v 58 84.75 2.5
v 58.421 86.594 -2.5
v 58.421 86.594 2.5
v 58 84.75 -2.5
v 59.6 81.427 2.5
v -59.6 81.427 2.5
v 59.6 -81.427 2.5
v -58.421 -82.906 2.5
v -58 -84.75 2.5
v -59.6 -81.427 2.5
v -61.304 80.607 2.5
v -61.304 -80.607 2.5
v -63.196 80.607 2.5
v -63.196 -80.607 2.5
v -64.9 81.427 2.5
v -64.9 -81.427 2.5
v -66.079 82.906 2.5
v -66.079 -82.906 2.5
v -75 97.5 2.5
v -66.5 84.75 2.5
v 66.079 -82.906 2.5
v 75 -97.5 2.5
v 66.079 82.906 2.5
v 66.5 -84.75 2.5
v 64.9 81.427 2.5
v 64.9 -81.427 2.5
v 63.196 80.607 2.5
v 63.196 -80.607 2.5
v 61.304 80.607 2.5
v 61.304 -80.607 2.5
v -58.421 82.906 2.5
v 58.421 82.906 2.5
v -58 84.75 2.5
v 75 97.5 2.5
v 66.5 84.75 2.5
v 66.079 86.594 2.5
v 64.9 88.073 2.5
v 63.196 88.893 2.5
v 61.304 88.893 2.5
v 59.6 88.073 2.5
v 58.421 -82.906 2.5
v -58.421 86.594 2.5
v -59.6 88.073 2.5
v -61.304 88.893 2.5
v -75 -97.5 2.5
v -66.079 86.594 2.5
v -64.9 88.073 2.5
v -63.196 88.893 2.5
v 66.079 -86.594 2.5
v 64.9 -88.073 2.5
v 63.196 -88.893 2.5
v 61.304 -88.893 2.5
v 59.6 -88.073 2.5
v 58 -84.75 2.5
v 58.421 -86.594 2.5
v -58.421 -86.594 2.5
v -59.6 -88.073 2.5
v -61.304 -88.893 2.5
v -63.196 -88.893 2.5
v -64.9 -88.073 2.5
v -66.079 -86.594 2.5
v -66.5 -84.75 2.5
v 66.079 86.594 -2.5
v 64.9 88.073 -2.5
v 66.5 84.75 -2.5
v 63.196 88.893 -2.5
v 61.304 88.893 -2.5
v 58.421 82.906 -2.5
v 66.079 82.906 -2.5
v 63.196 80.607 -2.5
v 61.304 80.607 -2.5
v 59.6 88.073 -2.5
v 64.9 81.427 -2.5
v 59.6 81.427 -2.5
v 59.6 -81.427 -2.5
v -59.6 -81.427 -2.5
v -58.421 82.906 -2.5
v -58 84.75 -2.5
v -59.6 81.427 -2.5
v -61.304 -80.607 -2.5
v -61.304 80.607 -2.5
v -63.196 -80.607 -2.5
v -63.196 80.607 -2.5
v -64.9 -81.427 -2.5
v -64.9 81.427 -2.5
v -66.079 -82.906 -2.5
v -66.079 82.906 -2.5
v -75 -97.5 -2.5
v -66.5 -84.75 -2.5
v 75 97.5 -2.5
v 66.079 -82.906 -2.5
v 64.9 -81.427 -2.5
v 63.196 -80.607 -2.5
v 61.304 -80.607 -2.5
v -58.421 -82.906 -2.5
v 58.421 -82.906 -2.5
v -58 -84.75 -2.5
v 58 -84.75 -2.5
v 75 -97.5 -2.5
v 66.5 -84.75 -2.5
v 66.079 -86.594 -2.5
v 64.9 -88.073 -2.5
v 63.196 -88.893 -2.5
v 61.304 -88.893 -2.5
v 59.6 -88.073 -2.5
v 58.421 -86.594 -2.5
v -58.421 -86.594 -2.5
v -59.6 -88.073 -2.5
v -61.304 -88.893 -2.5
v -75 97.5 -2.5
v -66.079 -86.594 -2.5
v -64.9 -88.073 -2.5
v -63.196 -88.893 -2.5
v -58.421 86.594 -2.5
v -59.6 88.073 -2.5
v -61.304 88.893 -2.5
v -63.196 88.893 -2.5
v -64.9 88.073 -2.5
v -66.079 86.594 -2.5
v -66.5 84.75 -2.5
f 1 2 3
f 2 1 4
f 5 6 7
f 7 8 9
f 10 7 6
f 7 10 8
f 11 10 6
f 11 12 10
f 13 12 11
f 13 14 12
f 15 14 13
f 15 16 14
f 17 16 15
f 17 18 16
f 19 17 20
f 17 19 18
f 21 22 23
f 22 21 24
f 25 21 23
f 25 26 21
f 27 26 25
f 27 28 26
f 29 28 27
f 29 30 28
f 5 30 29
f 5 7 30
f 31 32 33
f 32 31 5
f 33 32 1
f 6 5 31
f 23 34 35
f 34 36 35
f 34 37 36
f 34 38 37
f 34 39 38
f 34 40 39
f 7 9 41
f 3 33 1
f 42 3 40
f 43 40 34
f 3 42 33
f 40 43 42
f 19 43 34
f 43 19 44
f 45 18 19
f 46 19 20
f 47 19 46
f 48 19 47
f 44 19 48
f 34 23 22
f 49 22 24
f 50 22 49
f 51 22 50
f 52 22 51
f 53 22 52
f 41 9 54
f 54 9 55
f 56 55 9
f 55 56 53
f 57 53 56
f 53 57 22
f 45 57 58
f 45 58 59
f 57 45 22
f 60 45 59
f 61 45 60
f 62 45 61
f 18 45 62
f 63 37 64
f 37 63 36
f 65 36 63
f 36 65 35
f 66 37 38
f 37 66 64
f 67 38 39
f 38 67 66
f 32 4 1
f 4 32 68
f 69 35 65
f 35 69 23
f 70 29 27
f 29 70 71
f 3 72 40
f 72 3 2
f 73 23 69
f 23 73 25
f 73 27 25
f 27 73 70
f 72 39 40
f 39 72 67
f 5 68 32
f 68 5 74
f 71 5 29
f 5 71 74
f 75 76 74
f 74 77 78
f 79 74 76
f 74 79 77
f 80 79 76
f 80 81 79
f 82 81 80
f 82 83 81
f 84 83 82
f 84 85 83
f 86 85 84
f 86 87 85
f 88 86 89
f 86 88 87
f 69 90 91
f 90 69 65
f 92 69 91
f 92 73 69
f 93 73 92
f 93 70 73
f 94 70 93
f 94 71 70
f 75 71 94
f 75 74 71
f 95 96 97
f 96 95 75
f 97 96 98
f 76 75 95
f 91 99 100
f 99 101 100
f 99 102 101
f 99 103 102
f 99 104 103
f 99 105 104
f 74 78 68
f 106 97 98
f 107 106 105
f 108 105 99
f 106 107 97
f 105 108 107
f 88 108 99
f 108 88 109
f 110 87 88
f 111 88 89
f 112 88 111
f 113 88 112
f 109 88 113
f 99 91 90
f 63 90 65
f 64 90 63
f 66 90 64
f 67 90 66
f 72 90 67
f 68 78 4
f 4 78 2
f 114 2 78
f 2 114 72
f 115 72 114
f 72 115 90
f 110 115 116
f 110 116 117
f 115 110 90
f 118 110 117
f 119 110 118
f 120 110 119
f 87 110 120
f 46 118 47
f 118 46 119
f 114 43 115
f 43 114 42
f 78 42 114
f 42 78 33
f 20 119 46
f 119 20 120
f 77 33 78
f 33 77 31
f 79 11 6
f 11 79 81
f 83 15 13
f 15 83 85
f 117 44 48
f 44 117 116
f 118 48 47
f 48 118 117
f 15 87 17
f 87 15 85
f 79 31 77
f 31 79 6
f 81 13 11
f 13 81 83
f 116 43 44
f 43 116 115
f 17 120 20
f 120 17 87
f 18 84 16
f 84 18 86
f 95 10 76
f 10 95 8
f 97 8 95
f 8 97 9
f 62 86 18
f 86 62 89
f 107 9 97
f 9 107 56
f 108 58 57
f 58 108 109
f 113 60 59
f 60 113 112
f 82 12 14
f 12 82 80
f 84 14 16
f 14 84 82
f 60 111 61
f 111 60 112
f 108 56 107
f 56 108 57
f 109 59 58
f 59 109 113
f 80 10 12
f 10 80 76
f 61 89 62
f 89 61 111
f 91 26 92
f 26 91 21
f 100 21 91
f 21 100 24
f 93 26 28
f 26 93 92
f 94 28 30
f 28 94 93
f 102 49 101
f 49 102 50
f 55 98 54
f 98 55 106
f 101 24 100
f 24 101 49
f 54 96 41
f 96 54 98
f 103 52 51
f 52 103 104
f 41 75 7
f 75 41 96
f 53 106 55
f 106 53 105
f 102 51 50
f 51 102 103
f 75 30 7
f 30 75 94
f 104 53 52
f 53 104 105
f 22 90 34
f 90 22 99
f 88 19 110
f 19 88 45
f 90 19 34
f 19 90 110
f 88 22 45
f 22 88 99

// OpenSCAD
// Generated by SolidPython 1.1.3 on 2023-10-16 11:59:45


difference() {
	cube(center = true, size = [150, 195.0000000000, 5]);
	union() {
		translate(v = [62.2500000000, 84.7500000000]) {
			cylinder(center = true, h = 5, r = 4.2500000000);
		}
		translate(v = [-62.2500000000, 84.7500000000]) {
			cylinder(center = true, h = 5, r = 4.2500000000);
		}
		translate(v = [-62.2500000000, -84.7500000000]) {
			cylinder(center = true, h = 5, r = 4.2500000000);
		}
		translate(v = [62.2500000000, -84.7500000000]) {
			cylinder(center = true, h = 5, r = 4.2500000000);
		}
	}
}
/***********************************************
*********      SolidPython code:      **********
************************************************
 
import solid
import numbers
import pudb
from solid.utils import *
import viewscad
import subprocess
import os
import os.path as osp
import math
import sys

chamfer_extrude=solid.import_scad("./chamfer_extrude.scad")
chamfer_extrude=chamfer_extrude.chamfer_extrude
r = viewscad.Renderer(width=800, height=800)

def debug(model,f_name,path="/home/ts/code/projects/mfd/designs/debug"):
    solid.scad_render_to_file(model,osp.join(path,f_name)+".scad")
#generate position list of wells using offset from center
wells_pos_from_center_4 = lambda offset: [[-offset,offset],
                                        [offset, offset],
                                        [-offset, -offset],
                                        [offset, -offset]]
#wells_pos_from_center_2 = lambda offset: [[0,offset],
#                                        [0, -offset]]
wells_pos_from_center_2 = lambda offset: [[offset,0],
                                        [-offset,0]]

def make_well(dims,shape=None,height=None,dxf=False):
    def circle_cylinder():
        if dxf or (height is None):
            well = solid.circle(r=dims, segments=64)
        else:
            well = solid.cylinder(r=dims, h=height, segments=64, center = True)
        return well
    if dims is None:
        sys.exit("radius needs to be a number")
    if isinstance(dims, numbers.Number):
        well =circle_cylinder()
    elif len(dims)==1:
        if isinstance(dims[1], numbers.Number):
            well =circle_cylinder()
        else:
            sys.exit("radius needs to be a number")
    elif len(dims)==2:
        well = solid.square(dims,center = True)
    elif len(dims)==3:
        well = solid.cube(dims, center = True)
    return well

def wells_top_bottom(center_gap,device_dims=None,shape=None,height=None, positions = None, dxf = False):
    well_shape = make_well(device_dims,shape=shape,height=height,dxf=dxf)
    wells = []
    if positions is None:
        offset = radius+radius/2.0
        positions = wells_pos_from_center_2(offset)
    if dxf or (height is None):
        height = 0
    for position in positions:
        if dxf:
            wells.append(solid.translate([position[0],position[1]])(well_shape))
        else:
            wells.append(solid.translate([position[0],position[1],height/2.0])(well_shape))
    return  union()(*wells)

#place wells in four corners 
def four_corner(radius,height=None, positions = None, dxf = False):
    #if well pos not specified set
    #to equally spaced by half radius
    if positions is None:
        offset = radius+radius/2.0
        positions = wells_pos_from_center_4(offset)
    if dxf or (height is None):
        height = 0
    #make wells at positions with specified radius and height
    wells = []
    for position in positions:
        #make circle if making dxf
        if dxf:
            well_shape = solid.circle(r=radius, segments=64)
            well_shape = solid.translate([position[0],position[1]])(well_shape)
        #if stl make cylinder
        else:
            well_shape = solid.cylinder(r=radius, h=height, segments=64, center = True)
            well_shape = solid.translate([position[0],position[1],height/2.0])(well_shape)
        wells.append(well_shape)
    return  union()(*wells)

#generate channels 
def make_channels(length,width,height=0,num_chans=1,max_chans=None,spacing=None, dxf = False,
                  rotate_channels=False):
    if dxf or (height is None):
        height = 0
    #if channel gap not defined, is equal to
    if spacing is None: spacing = width
    #calculate number of channels if fitting max num within given width
    if not max_chans is None:
        import math
        num_chans = math.floor((max_chans-spacing)/(width+spacing))
    #get total width of channel section  
    total_width = (width*num_chans)+(spacing*(num_chans-1))

    #make template channel
    #if rotate_channels: width, length = length, width
    if dxf:
        channel_t = solid.square([length,width],center = True)
    else:
        channel_t = solid.cube([length,width,height], center = True)

    #if number channels is even, offset the first channel to center its gap
    if num_chans % 2 == 0: centering = -(width/2.0+spacing/2.0)
    else: centering = 0
    #move template channel up to align bottom at z = 0 
    #and offset center if necessary
    if dxf:
        channel_t = solid.translate([0,centering])(channel_t)
    else:
        channel_t = solid.translate([0,centering,height/2.0])(channel_t)

    #if rotate_channels: length,width = width,length
    #start making the channels
    channels = []
    for i in range(num_chans):
        #if i=0 there is no translation
        #if i=1, we make the first channel adjacent to second
        direction = i

        #if i>=1, we add channels alternating left and right
        if i >= 1:
            direction = -(i/2.0)
            if i % 2 == 1: direction = (-direction)+0.5
                
        #make channel at right position and add it to channel list
        translation_coords = [0,direction*(width+spacing)]
        #if rotate_channels: translation_coords = [direction*(width+spacing),0]
        if dxf:
            channel = solid.translate(translation_coords)(channel_t)
        else:
            channel = solid.translate([*translation_coords,0])(channel_t)
        channels.append(channel)
    
    #group all channels as one object
    channels = union()(*channels)
    #compute the x,y,z dimensions in order to pass as arguments 
    #for construction of other parts of device (such as the chambers)
    measurements = {'x':(length/2.0,-length/2.0),
                    'y':(total_width/2.0,-total_width/2.0)}
    if not dxf:
        measurements['z'] = (height,0)
    if rotate_channels:
        channels = solid.rotate(90)(channels)
        measurements['x'],measurements['y']=measurements['y'],measurements['x']
    return channels,measurements

def make_chambers(msrs,height=None,extra=0,len_until=None,width=None, dxf = False):
    #computes x,y,z length
    total = lambda x : abs(x[0]) + abs(x[1])
    
    #if specific height if specified
    #otherwise use same height as channels
    if dxf:
        pass
    elif not height is None:
        msrs['z'] = (height,0)
    else:
        msrs['z'] = (0,0)
        
    #make copy of measurements from channels to modify chamber dimensions 
    #and add length to chambers as specified
    chamber_dims = msrs.copy()
    #calculate length of chamber to reach specified offset
    if not len_until is None:
        chamber_len = len_until-(msrs['x'][0])
    #or add specified length to channel length (if not specified, adds 0)
    else:
        chamber_len = msrs['x'][0]+extra
    #set the chamber length based 
    chamber_dims['x'] = (chamber_len/2.0,-(chamber_len/2.0))
    #compute final dimensions of chamber
    if not width is None:
        chamber_dims['y'] = (width/2.0,-width/2.0)
    chamber_dims = [total(size) for size in chamber_dims.values()]
        
    #calculate chamber translation offset to place adjacent to channels
    chamber_trslt = msrs['x'][0]+(chamber_len/2.0)
    #compute chamber translation coordinates to align with channels
    #x = 1 moves chamber above channels
    #x = -1 moves chamber below channels
    if dxf:
        trslt = lambda x : [x*(chamber_trslt),0]
    else:
        trslt = lambda x : [x*(chamber_trslt),0,msrs['z'][0]/2.0]
    
    #function to make chamber at top or at bottom 
    if dxf:
        move = lambda x : solid.translate(trslt(x))(solid.square(chamber_dims, center = True) )
    else:
        move = lambda x : solid.translate(trslt(x))(solid.cube(chamber_dims,center = True))
    #make top and bottom chambers and return them as grouped
    top = move(1)
    bottom = move(-1)
    #chambers=solid.rotate(90)(solid.union()(top,bottom))
    chambers=(solid.union()(top,bottom))

    return chambers

#create alignment features 
def alignment_features(unit,dims,grid_size, mask_size = None, alignment = "hollow", units_from_center = (2.5,2.5), corner_len=None):
    width = grid_size[0]*dims[0]
    length = grid_size[1]*dims[1]
    if mask_size is None and corner_len is None:
        corner_len = (dims[0] + dims[1]) /2 / 8
    corner = lambda thickness_div : solid.union()( solid.square([corner_len,corner_len/thickness_div],center=False), solid.square([corner_len/thickness_div,corner_len],center=False) )
    
    def make_full(thickness_div):
        thickness = corner_len/thickness_div
        tr = solid.translate([0, 0, 0 ])(solid.rotate(180)(corner(thickness_div)))
        tr = solid.translate([thickness/2,thickness/2,0])(tr)
        bl = solid.translate([0, 0, 0 ])(solid.rotate(0)(corner(thickness_div)))
        bl = solid.translate([-thickness/2,-thickness/2,0])(bl)
        return solid.union()(tr,bl)
    
    def make_hollow(thickness_div):
        thickness = corner_len/(thickness_div/2)
        inner = make_full(thickness_div)
        outer = make_full(thickness_div/2)
        hollow = outer - inner 
        return hollow
    
    center = (width /2 , length/2)
    mask_pos = lambda x,y : (center[0] + x*(float(units_from_center[0])*dims[0]), center[1] + y*(float(units_from_center[1])*dims[1]))
    positions = []
    positions.append(mask_pos(1,0))
    positions.append(mask_pos(0,1))
    positions.append(mask_pos(-1,0))
    positions.append(mask_pos(0,-1))
    make_mask = lambda mtype : make_hollow(8) if mtype == "hollow" else make_full(8)
    masks = [ solid.translate([*position,0])(make_mask(alignment)) for position in positions]
    
    solid.scad_render_to_file(solid.union()(*masks),"./designs/open_chamber/masks.scad")
    #return unit - solid.union()(*masks)
    return solid.union()(*masks,unit)

def create_outline(thickness, array, dims, grid_size,):
    width = grid_size[0]*dims[0] + thickness *2
    length = grid_size[1]*dims[1] + thickness *2
    outer = solid.translate([-thickness, -thickness,0])(solid.square([width, length]))
    return outer-array

def create_wall(wall_thickness, outline_thickness, dims, grid_size, wall_height = 2000, dxf = False):
    inner_width = grid_size[0]*dims[0] + outline_thickness *2
    inner_length = grid_size[1]*dims[1] + outline_thickness *2
    outer_width = inner_width + wall_thickness * 2
    outer_length = inner_length + wall_thickness * 2
    outer_pos_x = -outline_thickness-wall_thickness
    outer_pos_y = -outline_thickness-wall_thickness
    inner_pos_x = -outline_thickness
    inner_pos_y = -outline_thickness
    if dxf:
        inner_wall = solid.translate([inner_pos_x,
                                      inner_pos_y,
                                      0])(solid.square([inner_width, inner_length]))
        outer_wall = solid.translate([outer_pos_x,
                                      outer_pos_y,
                                      0])(solid.square([outer_width, outer_length]))

        return outer_wall-inner_wall
    else:
        inner_wall = solid.translate([inner_pos_x,
                                      inner_pos_y,
                                      0])(solid.cube([inner_width, inner_length,wall_height]))
        outer_wall = solid.translate([outer_pos_x,
                                      outer_pos_y,
                                      0])(solid.cube([outer_width, outer_length,wall_height]))

        return outer_wall-inner_wall, {'wall_height': wall_height,
                                       'wall_thickness': wall_thickness,
                                       'inner_width':inner_width,
                                       'inner_length': inner_length,
                                       'outer_width': outer_width,
                                       'outer_length': outer_length,
                                       'outer_pos_x' : outer_pos_x,
                                       'outer_pos_y' : outer_pos_y,
                                       'inner_pos_x' : inner_pos_x,
                                       'inner_pos_y' : inner_pos_y}

def create_thicker_wall(wall_thickness, outer_wall_offset, wall_dims, dims, grid_size, height_start = .2, height_end=2, dxf = False):
    addon_wall,thicker_wall_dims = create_wall(wall_thickness, outer_wall_offset, dims, grid_size, wall_height=height_end-height_start, dxf = False)
    addon_wall = solid.translate([0,0,height_start])(addon_wall)

    thicker_wall_dims['wall_height'] = height_end
    thicker_wall_dims['wall_thickness'] = wall_dims['wall_thickness'] + wall_thickness
    return addon_wall, thicker_wall_dims
 
def add_lock_to_wall(wall,wall_dims,y_offset = 0,cut_ratio=0.7,L_length=3, gap_ratio=0.05, axis="x",width_ratio=1/2):
    # Makes L shape
    def make_L(max_length,length_thickness,max_width,width_thickness,height,y_offset):
        length = solid.cube([max_length,length_thickness,height])
        width = solid.cube([width_thickness,max_width,height])
        width = solid.translate([max_length-(width_thickness),0,0])(width)
        L = solid.union()(width,length)
        debug(L,"L")
        if axis == "x":
            L = solid.rotate(-90)(L)
            L = solid.translate([0,max_length,0])(L)
        else:
            L = solid.rotate(-180)(L)
            L = solid.translate([max_length,max_width,0])(L)
        return solid.translate([0,0,y_offset])(L)
    
    lock_length = L_length
    lock_width = wall_dims['wall_thickness']*width_ratio
    lock_length_thickness = lock_width/2
    lock_width_thickness = lock_width/2
    L_lock = make_L(lock_length,lock_length_thickness,lock_width,lock_width_thickness, wall_dims['wall_height']-y_offset, y_offset)
    
    margin_space = lock_length - lock_length*(1-gap_ratio)
    key_length = lock_length-margin_space
    key_length_thickness = lock_length_thickness-(margin_space*2)
    key_width = lock_width-(margin_space*2)
    key_width_thickness = lock_width_thickness-(margin_space*2)
    L_key = make_L(key_length,key_length_thickness,key_width,key_width_thickness, wall_dims['wall_height']-y_offset, y_offset)
    L_key = solid.translate([margin_space,margin_space,0])(L_key)
    L = solid.union()(L_lock,L_key)
    debug(L,"L")
    
    #Make cube to be used as negative to split frame in a half
    #Can choose if making left or right negative, specify ratio of split
    def make_negative(right,cut_ratio):
        if axis == "x":
            if right:
                length = wall_dims['outer_length']*(1-cut_ratio)
                pos_x = wall_dims['outer_pos_x']+(wall_dims['outer_length']*cut_ratio)
            else:
                length = wall_dims['outer_length']*(cut_ratio)
                pos_x = wall_dims['outer_pos_x'] 
            negative = solid.cube([wall_dims['outer_width'],length, wall_dims['wall_height']])
            negative = solid.translate([wall_dims['outer_pos_y'],pos_x,0])(negative)
        else:
            if right:
                length = wall_dims['outer_width']*(1-cut_ratio)
                pos_x = wall_dims['outer_pos_y']+(wall_dims['outer_width']*cut_ratio)
            else:
                length = wall_dims['outer_width']*(cut_ratio)
                pos_x = wall_dims['outer_pos_y'] 
            negative = solid.cube([length,wall_dims['outer_length'], wall_dims['wall_height']])
            negative = solid.translate([pos_x,wall_dims['outer_pos_x'],0])(negative)
        return negative, pos_x, length 
                      
    #Make negatives
    negative_right, right_half_pos_x, right_half_length = make_negative(True,cut_ratio)
    negative_left, left_half_pos_x, right_half_length = make_negative(False,cut_ratio)
    #Make halves
    left_half = solid.difference()(wall,negative_right)
    right_half = solid.difference()(wall,negative_left)
    def place_L(L, L_length,L_width):
        #Place L on top wall       
        offset_to_center = (wall_dims['wall_thickness']-L_width)/2
        if axis == "x":
            y_pos_top = (wall_dims['outer_pos_y'] +
                    wall_dims['outer_width'] - 
                    L_width - offset_to_center)
            top_L = solid.translate([y_pos_top,
                                     right_half_pos_x-(L_length),
                                     0])(L)
            #Place L on bottom wall       
            y_pos_bottom = wall_dims['outer_pos_y']+offset_to_center
            bottom_L = solid.translate([y_pos_bottom,
                                        right_half_pos_x-L_length,
                                        0])(L)
        else:
            y_pos_top = (wall_dims['outer_pos_x'] +
                    wall_dims['outer_length'] -
                    (L_width+offset_to_center))
            top_L = solid.translate([right_half_pos_x-L_length,
                                     y_pos_top,
                                     0])(L)
            #Place L on bottom wall       
            y_pos_bottom = wall_dims['outer_pos_y']+offset_to_center
            bottom_L = solid.translate([right_half_pos_x-L_length,
                                        y_pos_bottom,
                                        0])(L)
        return bottom_L, top_L
    #Make complimentary L pieces through union and differences
    #Make Lock
    bottom_L_lock, top_L_lock = place_L(L_lock,L_length,lock_width)
    left_half = solid.difference()(left_half,bottom_L_lock)
    left_half = solid.difference()(left_half,top_L_lock)
    #Make Key
    bottom_L_key, top_L_key = place_L(L_key,L_length,lock_width)
    right_half = solid.union()(right_half,bottom_L_key)
    right_half = solid.union()(right_half,top_L_key)
    return left_half, right_half


#build a row x col grid of containment units
def make_unit_array(unit,dims,grid_size, dxf = False, alignment = None, mask_size = None,
                    units_from_center = None,alignment_offset=None, alignment_mark_size=1):
    units = []
    for col in range(grid_size[1]):
        for row in range(grid_size[0]):
            if dxf:
                units.append(solid.translate([row*dims[0],col*dims[1]])(unit))
            else:
                units.append(solid.translate([row*dims[0],col*dims[1],dims[2]/2.0])(unit))
    array = solid.union()(*units)
    if (not alignment is None) and dxf:
        if not alignment_offset is None:
            array = solid.translate([alignment_offset[0],alignment_offset[1]])(array)
        array = alignment_features(array,dims, grid_size, alignment = alignment, mask_size = None, units_from_center = units_from_center,corner_len=alignment_mark_size)
        if not alignment_offset is None:
            array = solid.translate([-alignment_offset[0],-alignment_offset[1]])(array)
    return array


def make_taylor(wells_pos = wells_pos_from_center_4(2.25), well_rad = 1.5 ,
                well_height = 2, chan_w = 0.01, chan_l = 1, chan_h = 0.010 ,
                chan_gap = 0.040, max_chans = None,num_chans=100, chamber_height  = 0.100,
                columns = 1, rows = 1, chamber_len_until=2.25, add_channels = True, add_wells = True, 
                add_chambers = True, save_path = "./", alignment = None, units_from_center = 2,
                mask_size = None, render_stl = False, outline_thickness = 0.050, dxf = True,
                wall_height = 15, wall_thickness = 0.95, casing_x=9, casing_y=9, casing_z=0,rotate_units=0):

    dims = [casing_x, casing_y, casing_z]
    wells = four_corner(well_rad,well_height, dxf = dxf, positions = wells_pos)
    debug(wells,"wells")
    channels, msrs = make_channels(chan_l,chan_w,chan_h,dxf=dxf, spacing = chan_gap, max_chans=max_chans,num_chans=num_chans)
    debug(channels,"channels")
    chambers = make_chambers(msrs,dxf = dxf, height=chamber_height,len_until=chamber_len_until)
    debug(chambers,"chambers")

    #add together and render
    device_parts = []
    if add_channels:
        device_parts.append(channels)
    if add_wells:
        device_parts.append(wells)
    if add_chambers:
        device_parts.append(chambers)
    device=union()(*device_parts)
    device = rotate(rotate_units)(device)

    device=solid.translate([dims[0]/2.0,dims[1]/2.0,0])(device)
    channels = rotate(rotate_units)(channels)
    channels=solid.translate([dims[0]/2,dims[1]/2,0])(channels)
    chambers_wells = union()(wells,chambers)
    chambers_wells = rotate(rotate_units)(chambers_wells)
    chambers_wells=solid.translate([dims[0]/2,dims[1]/2,0])(chambers_wells)

    file_name = str(rows)+'x'+str(columns)+'_units_'
    grid_size = [rows,columns]

    if alignment:
        alignment="full"
    device = make_unit_array(device,dims,grid_size, dxf=dxf, alignment = alignment,
                                 units_from_center = units_from_center)
    channels = make_unit_array(channels,dims,grid_size, dxf=dxf, alignment = alignment,
                                 units_from_center = units_from_center)
    if alignment=="full":
        alignment="hollow"

    chambers_wells = make_unit_array(chambers_wells,dims,grid_size, dxf=dxf, alignment = alignment,
                                 units_from_center =units_from_center)

    def save_model(model,prefix):
        model_fname = os.path.abspath(save_path+prefix+"_"+file_name+".scad")
        solid.scad_render_to_file(model,model_fname)
        return model_fname

    wells_fname = save_model(wells,"wells")
    channels_fname = save_model(channels,"channels")
    device_fname = save_model(device,"device")
    chambers_wells_fname = save_model(chambers_wells,"chambers_wells")
    return (chambers_wells,chambers_wells_fname), (channels,channels_fname), (device,device_fname)

def make_device(design='open',rows=8,columns=6,wells_pos = 4.5,well_offset=3.2, well_rad=3.2,well_height=0.1,
                chan_l=1,chan_w=0.01,chan_h=0.01,chan_gap=0.015,num_chans=101,dxf=True,save_path="./designs/open_chamber/",
                casing_x=9.0,casing_y=18.0,casing_z=0,rotate_units=90,units_from_center=(3,1),chamber_len_until=4.5,
                chamber_width=None,alignment=True, add_wells=True, add_channels=True,add_chambers=True):

    dims = [casing_x, casing_y, casing_z]
    if design == "open":
        wells_pos=wells_pos_from_center_2(wells_pos)
        wells = wells_top_bottom(well_offset*2,device_dims=well_rad,height=well_height, dxf = dxf, positions = wells_pos)
    elif design == "closed":
        wells_pos=wells_pos_from_center_4(wells_pos)
        debug(wells,"wells")
        wells = four_corner(well_offset,well_heightdevice_dims=well_rad, dxf = dxf, positions = wells_pos)
    else:
        print(design+" is not a valid design.\n Choose valid design: 'open' or 'closed'")
        exit()
    wells = rotate(rotate_units)(wells)
    wells=solid.translate([dims[0]/2,dims[1]/2,0])(wells)
    debug(wells,"wells")

    channels, msrs = make_channels(chan_l,chan_w,chan_h,dxf=dxf, spacing = chan_gap, num_chans=num_chans,rotate_channels=False)
    channels = rotate(rotate_units)(channels)
    channels=solid.translate([dims[0]/2,dims[1]/2,0])(channels)

    chambers=make_chambers(msrs,height=None,extra=0,len_until=chamber_len_until, width=chamber_width,dxf = dxf)
    chambers = rotate(rotate_units)(chambers)
    chambers=solid.translate([dims[0]/2,dims[1]/2,0])(chambers)

    device_parts = []
    if add_channels:
        device_parts.append(channels)
    if add_wells:
        device_parts.append(wells)
    if add_chambers:
        device_parts.append(chambers)
    device = union()(*device_parts)
    #device = rotate(rotate_units)(device)
    #device=solid.translate([dims[0]/2.0,dims[1]/2.0,0])(device)

    chambers_wells = []
    if add_chambers:
        chambers_wells.append(chambers)
    if add_wells:
        chambers_wells.append(wells)
    chambers_wells = union()(*chambers_wells)
    #chambers_wells = union()(wells,chambers)
    #chambers_wells = rotate(rotate_units)(chambers_wells)
    #chambers_wells=solid.translate([dims[0]/2,dims[1]/2,0])(chambers_wells)

    file_name = str(rows)+'x'+str(columns)+'_units_'

    grid_size = [rows,columns]
    if alignment:
        alignment="full"
    device = make_unit_array(device,dims,grid_size, dxf=dxf, alignment = alignment,
                                 units_from_center = units_from_center)
    channels = make_unit_array(channels,dims,grid_size, dxf=dxf, alignment = alignment,
                                 units_from_center = units_from_center)
    if alignment=="full":
        alignment="hollow"

    chambers_wells = make_unit_array(chambers_wells,dims,grid_size, dxf=dxf, alignment = alignment,
                                 units_from_center =units_from_center)

    def save_model(model,prefix):
        model_fname = os.path.abspath(save_path+prefix+"_"+file_name+".scad")
        solid.scad_render_to_file(model,model_fname)
        return model_fname

    wells_fname = save_model(wells,"wells")
    channels_fname = save_model(channels,"channels")
    device_fname = save_model(device,"device")
    chambers_wells_fname = save_model(chambers_wells,"chambers_wells")
    return (chambers_wells,chambers_wells_fname), (channels,channels_fname), (device,device_fname)


def make_open_chamber(rows=8,columns=6,wells_pos = wells_pos_from_center_2(4.5), well_rad=3.2,well_height=0.1,
                      chan_l=1,chan_w=0.01,chan_h=0.01,chan_gap=0.015,num_chans=101,dxf=True,save_path="./designs/open_chamber/",
                      casing_x=9.0,casing_y=18.0,casing_z=0,rotate_units=90,units_from_center=(3,1),chamber_len_until=4.5,
                      chamber_width=None,alignment=True, add_wells=True, add_channels=True,add_chambers=True):

    dims = [casing_x, casing_y, casing_z]
    wells = wells_top_bottom(well_rad,height=well_height, dxf = dxf, positions = wells_pos)
    channels, msrs = make_channels(chan_l,chan_w,chan_h,dxf=dxf, spacing = chan_gap, num_chans=num_chans,rotate_channels=False)
    chambers=make_chambers(msrs,height=None,extra=0,len_until=chamber_len_until, width=chamber_width,dxf = dxf)
    debug(chambers,"chambers")
    device_parts = []
    if add_channels:
        device_parts.append(channels)
    if add_wells:
        device_parts.append(wells)
    if add_chambers:
        device_parts.append(chambers)
    device = union()(*device_parts)
    device = rotate(rotate_units)(device)
    device=solid.translate([dims[0]/2.0,dims[1]/2.0,0])(device)
    channels = rotate(rotate_units)(channels)
    channels=solid.translate([dims[0]/2,dims[1]/2,0])(channels)
    chambers_wells = union()(wells,chambers)
    chambers_wells = rotate(rotate_units)(chambers_wells)
    chambers_wells=solid.translate([dims[0]/2,dims[1]/2,0])(chambers_wells)

    file_name = str(rows)+'x'+str(columns)+'_units_'

    grid_size = [rows,columns]
    if alignment:
        alignment="full"
    device = make_unit_array(device,dims,grid_size, dxf=dxf, alignment = alignment,
                                 units_from_center = units_from_center)
    channels = make_unit_array(channels,dims,grid_size, dxf=dxf, alignment = alignment,
                                 units_from_center = units_from_center)
    if alignment=="full":
        alignment="hollow"

    chambers_wells = make_unit_array(chambers_wells,dims,grid_size, dxf=dxf, alignment = alignment,
                                 units_from_center =units_from_center)

    def save_model(model,prefix):
        model_fname = os.path.abspath(save_path+prefix+"_"+file_name+".scad")
        solid.scad_render_to_file(model,model_fname)
        return model_fname

    wells_fname = save_model(wells,"wells")
    channels_fname = save_model(channels,"channels")
    device_fname = save_model(device,"device")
    chambers_wells_fname = save_model(chambers_wells,"chambers_wells")
    return (chambers_wells,chambers_wells_fname), (channels,channels_fname), (device,device_fname)

def to_dxf(scad_path):
    dxf_path = scad_path.replace(".scad",".dxf")
    subprocess.call(["openscad", "-o", dxf_path, scad_path])
    import ezdxf
    temp_dxf = ezdxf.readfile(dxf_path)
    temp_dxf.saveas(dxf_path)

#def make_walls(diameter,thickness,grid_size,dims,height=20,segments=256,make_inner=True):
#    wafer_wall_out = solid.cylinder(r=diameter/2,h=height, segments=segments)
#    wafer_wall_in = solid.cylinder(r=(diameter/2-thickness),h=height, segments=segments)
#    wafer_wall = solid.difference()(wafer_wall_out,wafer_wall_in)
#    wafer_wall = solid.translate([grid_size[1]*dims[1]/2.0,grid_size[0]*dims[0]/2.0])(wafer_wall)
#
#    vertical_wall_length = grid_size[1]*dims[1]
#    horizontal_wall_length = grid_size[0]*dims[0]
#    vertical_wall = solid.cube([vertical_wall_length,thickness,height],center = True)
#    vertical_wall = solid.translate([vertical_wall_length/2,0,height/2])(vertical_wall)
#    horizontal_wall = solid.cube([thickness,horizontal_wall_length,height],center = True)
#    horizontal_wall = solid.translate([0,vertical_wall_length/2,height/2])(horizontal_wall)
#    walls = []
#    walls.append(horizontal_wall)
#    walls.append(vertical_wall)
#    for col in range(grid_size[1]):
#        if col == grid_size[1]-1: 
#            walls.append(solid.translate([0,(col+1)*dims[1]])(vertical_wall))
#        elif col > 0 and col < grid_size[1]-1 and make_inner==True:
#            walls.append(solid.translate([0,(col+1)*dims[1]])(vertical_wall))
#    for row in range(grid_size[0]):
#        if row == grid_size[0]-1: 
#            walls.append(solid.translate([(row+1)*dims[0],0])(horizontal_wall))
#        elif row > 0 and row < grid_size[0]-1 and make_inner==True:
#            walls.append(solid.translate([(row+1)*dims[0],0])(horizontal_wall))
#    walls = union()(*walls)
#    wafer_walls = union()(walls,wafer_wall)
#    return walls,wafer_wall,wafer_walls

def make_walls(diameter,thickness,grid_size,dims,height=20,segments=256,make_inner=True,padx=0,pady=0):
    wafer_wall_out = solid.cylinder(r=diameter/2,h=height, segments=segments)
    wafer_wall_in = solid.cylinder(r=(diameter/2-thickness),h=height, segments=segments)
    wafer_wall = solid.difference()(wafer_wall_out,wafer_wall_in)
    wafer_wall = solid.translate([grid_size[1]*dims[1]/2.0,grid_size[0]*dims[0]/2.0])(wafer_wall)

    vertical_wall_length = grid_size[0]*dims[0]+padx
    horizontal_wall_length = grid_size[1]*dims[1]+pady
    vertical_wall = solid.cube([vertical_wall_length,thickness,height],center = True)
    vertical_wall = solid.translate([vertical_wall_length/2-pady/2,-padx/2,height/2])(vertical_wall)
    horizontal_wall = solid.cube([thickness,horizontal_wall_length,height],center = True)
    horizontal_wall = solid.translate([-pady/2,horizontal_wall_length/2-padx/2,height/2])(horizontal_wall)
    walls = []
    walls.append(horizontal_wall)
    walls.append(vertical_wall)
    for col in range(grid_size[1]):
        if col == grid_size[1]-1: 
            walls.append(solid.translate([0,(col+1)*dims[1]+pady])(vertical_wall))
        elif col > 0 and col < grid_size[1]-1 and make_inner==True:
            walls.append(solid.translate([0,(col+1)*dims[1]])(vertical_wall))
    for row in range(grid_size[0]):
        if row == grid_size[0]-1: 
            walls.append(solid.translate([(row+1)*dims[0]+padx,0])(horizontal_wall))
        elif row > 0 and row < grid_size[0]-1 and make_inner==True:
            walls.append(solid.translate([(row+1)*dims[0],0])(horizontal_wall))
    walls = union()(*walls)
    wafer_walls = union()(walls,wafer_wall)
    return walls,wafer_wall,wafer_walls

def save_model(model,base_path,base_name,dxf=True):
    if not os.path.exists(base_path):
        os.makedirs(base_path)
    dxf_path=osp.join(base_path,base_name+".scad")
    solid.scad_render_to_file(model,osp.join(dxf_path))
    if dxf:
        to_dxf(dxf_path)

def make_wafer(diameter,flat_len,thickness):
    wafer = solid.cylinder(r1=diameter/2,r2=diameter/2,h=thickness,segments=512,)()
    x_start_flat=(flat_len/2)
    y_start_flat = math.sqrt(((diameter/2)**2) - (x_start_flat**2) )
    height_delete_flat=diameter/2-y_start_flat
    flat_delete = solid.cube([flat_len,height_delete_flat,thickness],center=False)()
    flat_delete = solid.translate([-flat_len/2,y_start_flat,0])(flat_delete)
    wafer = solid.difference()(wafer,flat_delete)
    wafer = solid.rotate(90)(wafer)
    return wafer

def add_wafer_to_mask(wafer_size,flat_len,mask,grid_size,dims,wafer_line_thickness=0.1,outer_mask_thickness=5,alignment_offset=None):
    def make_wafer_mask(wafer_size,flat_len):
        wafer_mask = make_wafer(wafer_size,flat_len,1)
        wafer_mask = solid.projection()(wafer_mask)
        wafer_mask = solid.translate([grid_size[0]*dims[0]/2.0,grid_size[1]*dims[1]/2.0])(wafer_mask)
        if not alignment_offset is None:
            wafer_mask = solid.translate([-alignment_offset[0],-alignment_offset[1]])(wafer_mask)
        return wafer_mask

    inner_wafer_line_mask = make_wafer_mask(wafer_size-wafer_line_thickness/2,flat_len)
    outer_wafer_line_mask = make_wafer_mask(wafer_size+wafer_line_thickness/2,flat_len)
    outer_wafer_mask = make_wafer_mask(wafer_size+outer_mask_thickness,flat_len)
    outer_wafer_mask = solid.difference()(outer_wafer_mask,outer_wafer_line_mask)
    wafer_mask = solid.union()(outer_wafer_mask,inner_wafer_line_mask)

    return solid.difference()(wafer_mask,mask)

def make_posts(post_shape,post_height):
    posts = solid.linear_extrude(height=post_height)(post_shape)
    return posts

def make_wafer_empty(diameter,flat_len,thickness,margin,notch_len=20,notch_height=5,oversize=1.01):
    diameter*=oversize
    flat_len*=oversize
    wafer = make_wafer(diameter,flat_len,thickness)
    holder = solid.cylinder(r1=diameter/2+margin,r2=diameter/2+margin,h=thickness,segments=512)()
    holder = solid.difference()(holder,wafer)

    x_start_flat=(flat_len/2)
    y_start_flat = math.sqrt(((diameter/2)**2) - (x_start_flat**2) )
    height_delete_flat=diameter/2-y_start_flat
    notch = solid.cube([notch_len,notch_height,thickness],center=False)()
    notch = solid.translate([-notch_len/2,y_start_flat,0])(notch)
    notch = solid.rotate(90)(notch)
    return solid.difference()(holder,notch)

def wafer_print_calibration(diameter,thickness,height,z_offset):
    circles = []
    radii = []
    radii.append(diameter/2.0*0.8)
    radii.append(diameter/2.0*0.6)
    radii.append(diameter/2.0*0.4)
    radii.append(diameter/2.0*0.2)
    for radius in radii:
        inner = solid.cylinder(r1=radius-(thickness/2.0),r2=radius-(thickness/2.0),h=thickness,segments=512,)()
        outer = solid.cylinder(r1=radius+(thickness/2.0),r2=radius+(thickness/2.0),h=thickness,segments=512,)()
        diff = solid.difference()(outer,inner)
        circles.append(diff)
    circles = solid.union()(*circles)
    circles = solid.translate([0,0,z_offset])(circles)
    return circles

def make_rack(wells,dims,grid_size,alignment_offset,rack_x,rack_y,rack_thickness,bolt_width,add_bolts=True):

    #get X and Y dimensions of gride of pipette tips
    X_len = dims[0]*grid_size[0]
    Y_len = dims[1]*grid_size[1]
    #make rack
    rack = solid.cube([rack_x,rack_y,rack_thickness],center=True)

    if add_bolts:
    #add bolt holes
        bolt_hole=solid.cylinder(r=bolt_width/2,h=rack_thickness,center=True)()
        bolt_holes = []
        bolt_holes.append(solid.translate([rack_x/2-1.5*bolt_width,rack_y/2-1.5*bolt_width])(bolt_hole))
        bolt_holes.append(solid.translate([-rack_x/2+1.5*bolt_width,rack_y/2-1.5*bolt_width])(bolt_hole))
        bolt_holes.append(solid.translate([-rack_x/2+1.5*bolt_width,-rack_y/2+1.5*bolt_width])(bolt_hole))
        bolt_holes.append(solid.translate([rack_x/2-1.5*bolt_width,-rack_y/2+1.5*bolt_width])(bolt_hole))
        bolt_holes = solid.union()(*bolt_holes)
        rack=solid.difference()(rack,bolt_holes)
    rack_support = rack

    #center rack with pipette holes
    rack = solid.translate([0,0,rack_thickness/2])(rack)
    rack = solid.translate([X_len/2,Y_len/2])(rack)
    rack = solid.translate([-alignment_offset[0],-alignment_offset[1]])(rack)
    wells = solid.linear_extrude(height=rack_thickness)(wells)
    rack = solid.difference()(rack,wells)
    return rack, rack_support

def make_pillar(wells,dims,grid_size,alignment_offset,rack_x,rack_y,pillar_height,rack_thickness,bolt_width,add_bolts=True,taper_angle=1,bolt_position_corner=1.5):

    #get X and Y dimensions of gride of pipette tips
    X_len = dims[0]*grid_size[0]
    Y_len = dims[1]*grid_size[1]
    #make rack
    rack = solid.cube([rack_x,rack_y,rack_thickness],center=True)
    
    if add_bolts:
    #add bolt holes
        bolt_hole=solid.cylinder(r=bolt_width/2,h=rack_thickness,center=True)()
        bolt_holes = []
        bolt_holes.append(solid.translate([rack_x/2-bolt_position_corner*bolt_width,rack_y/2-bolt_position_corner*bolt_width])(bolt_hole))
        bolt_holes.append(solid.translate([-rack_x/2+bolt_position_corner*bolt_width,rack_y/2-bolt_position_corner*bolt_width])(bolt_hole))
        bolt_holes.append(solid.translate([-rack_x/2+bolt_position_corner*bolt_width,-rack_y/2+bolt_position_corner*bolt_width])(bolt_hole))
        bolt_holes.append(solid.translate([rack_x/2-bolt_position_corner*bolt_width,-rack_y/2+bolt_position_corner*bolt_width])(bolt_hole))
        bolt_holes = solid.union()(*bolt_holes)
        rack=solid.difference()(rack,bolt_holes)
    rack_support = rack

    #center rack with pipette holes
    #rack = solid.translate([0,0,-rack_thickness])(rack)
    rack = solid.translate([X_len/2,Y_len/2])(rack)
    rack = solid.translate([-alignment_offset[0],-alignment_offset[1]])(rack)
    if not taper_angle == 0:
        wells=chamfer_extrude(pillar_height,taper_angle,segments=20)(wells)
    else:
        wells = solid.linear_extrude(height=pillar_height)(wells)
    rack = solid.union()(rack,wells)
    return rack, rack_support

def deg_taper_len(height,deg):
    if not deg == 0:
        return height*math.tan(math.radians(deg))
    else:
        return 0









 
 
************************************************/
